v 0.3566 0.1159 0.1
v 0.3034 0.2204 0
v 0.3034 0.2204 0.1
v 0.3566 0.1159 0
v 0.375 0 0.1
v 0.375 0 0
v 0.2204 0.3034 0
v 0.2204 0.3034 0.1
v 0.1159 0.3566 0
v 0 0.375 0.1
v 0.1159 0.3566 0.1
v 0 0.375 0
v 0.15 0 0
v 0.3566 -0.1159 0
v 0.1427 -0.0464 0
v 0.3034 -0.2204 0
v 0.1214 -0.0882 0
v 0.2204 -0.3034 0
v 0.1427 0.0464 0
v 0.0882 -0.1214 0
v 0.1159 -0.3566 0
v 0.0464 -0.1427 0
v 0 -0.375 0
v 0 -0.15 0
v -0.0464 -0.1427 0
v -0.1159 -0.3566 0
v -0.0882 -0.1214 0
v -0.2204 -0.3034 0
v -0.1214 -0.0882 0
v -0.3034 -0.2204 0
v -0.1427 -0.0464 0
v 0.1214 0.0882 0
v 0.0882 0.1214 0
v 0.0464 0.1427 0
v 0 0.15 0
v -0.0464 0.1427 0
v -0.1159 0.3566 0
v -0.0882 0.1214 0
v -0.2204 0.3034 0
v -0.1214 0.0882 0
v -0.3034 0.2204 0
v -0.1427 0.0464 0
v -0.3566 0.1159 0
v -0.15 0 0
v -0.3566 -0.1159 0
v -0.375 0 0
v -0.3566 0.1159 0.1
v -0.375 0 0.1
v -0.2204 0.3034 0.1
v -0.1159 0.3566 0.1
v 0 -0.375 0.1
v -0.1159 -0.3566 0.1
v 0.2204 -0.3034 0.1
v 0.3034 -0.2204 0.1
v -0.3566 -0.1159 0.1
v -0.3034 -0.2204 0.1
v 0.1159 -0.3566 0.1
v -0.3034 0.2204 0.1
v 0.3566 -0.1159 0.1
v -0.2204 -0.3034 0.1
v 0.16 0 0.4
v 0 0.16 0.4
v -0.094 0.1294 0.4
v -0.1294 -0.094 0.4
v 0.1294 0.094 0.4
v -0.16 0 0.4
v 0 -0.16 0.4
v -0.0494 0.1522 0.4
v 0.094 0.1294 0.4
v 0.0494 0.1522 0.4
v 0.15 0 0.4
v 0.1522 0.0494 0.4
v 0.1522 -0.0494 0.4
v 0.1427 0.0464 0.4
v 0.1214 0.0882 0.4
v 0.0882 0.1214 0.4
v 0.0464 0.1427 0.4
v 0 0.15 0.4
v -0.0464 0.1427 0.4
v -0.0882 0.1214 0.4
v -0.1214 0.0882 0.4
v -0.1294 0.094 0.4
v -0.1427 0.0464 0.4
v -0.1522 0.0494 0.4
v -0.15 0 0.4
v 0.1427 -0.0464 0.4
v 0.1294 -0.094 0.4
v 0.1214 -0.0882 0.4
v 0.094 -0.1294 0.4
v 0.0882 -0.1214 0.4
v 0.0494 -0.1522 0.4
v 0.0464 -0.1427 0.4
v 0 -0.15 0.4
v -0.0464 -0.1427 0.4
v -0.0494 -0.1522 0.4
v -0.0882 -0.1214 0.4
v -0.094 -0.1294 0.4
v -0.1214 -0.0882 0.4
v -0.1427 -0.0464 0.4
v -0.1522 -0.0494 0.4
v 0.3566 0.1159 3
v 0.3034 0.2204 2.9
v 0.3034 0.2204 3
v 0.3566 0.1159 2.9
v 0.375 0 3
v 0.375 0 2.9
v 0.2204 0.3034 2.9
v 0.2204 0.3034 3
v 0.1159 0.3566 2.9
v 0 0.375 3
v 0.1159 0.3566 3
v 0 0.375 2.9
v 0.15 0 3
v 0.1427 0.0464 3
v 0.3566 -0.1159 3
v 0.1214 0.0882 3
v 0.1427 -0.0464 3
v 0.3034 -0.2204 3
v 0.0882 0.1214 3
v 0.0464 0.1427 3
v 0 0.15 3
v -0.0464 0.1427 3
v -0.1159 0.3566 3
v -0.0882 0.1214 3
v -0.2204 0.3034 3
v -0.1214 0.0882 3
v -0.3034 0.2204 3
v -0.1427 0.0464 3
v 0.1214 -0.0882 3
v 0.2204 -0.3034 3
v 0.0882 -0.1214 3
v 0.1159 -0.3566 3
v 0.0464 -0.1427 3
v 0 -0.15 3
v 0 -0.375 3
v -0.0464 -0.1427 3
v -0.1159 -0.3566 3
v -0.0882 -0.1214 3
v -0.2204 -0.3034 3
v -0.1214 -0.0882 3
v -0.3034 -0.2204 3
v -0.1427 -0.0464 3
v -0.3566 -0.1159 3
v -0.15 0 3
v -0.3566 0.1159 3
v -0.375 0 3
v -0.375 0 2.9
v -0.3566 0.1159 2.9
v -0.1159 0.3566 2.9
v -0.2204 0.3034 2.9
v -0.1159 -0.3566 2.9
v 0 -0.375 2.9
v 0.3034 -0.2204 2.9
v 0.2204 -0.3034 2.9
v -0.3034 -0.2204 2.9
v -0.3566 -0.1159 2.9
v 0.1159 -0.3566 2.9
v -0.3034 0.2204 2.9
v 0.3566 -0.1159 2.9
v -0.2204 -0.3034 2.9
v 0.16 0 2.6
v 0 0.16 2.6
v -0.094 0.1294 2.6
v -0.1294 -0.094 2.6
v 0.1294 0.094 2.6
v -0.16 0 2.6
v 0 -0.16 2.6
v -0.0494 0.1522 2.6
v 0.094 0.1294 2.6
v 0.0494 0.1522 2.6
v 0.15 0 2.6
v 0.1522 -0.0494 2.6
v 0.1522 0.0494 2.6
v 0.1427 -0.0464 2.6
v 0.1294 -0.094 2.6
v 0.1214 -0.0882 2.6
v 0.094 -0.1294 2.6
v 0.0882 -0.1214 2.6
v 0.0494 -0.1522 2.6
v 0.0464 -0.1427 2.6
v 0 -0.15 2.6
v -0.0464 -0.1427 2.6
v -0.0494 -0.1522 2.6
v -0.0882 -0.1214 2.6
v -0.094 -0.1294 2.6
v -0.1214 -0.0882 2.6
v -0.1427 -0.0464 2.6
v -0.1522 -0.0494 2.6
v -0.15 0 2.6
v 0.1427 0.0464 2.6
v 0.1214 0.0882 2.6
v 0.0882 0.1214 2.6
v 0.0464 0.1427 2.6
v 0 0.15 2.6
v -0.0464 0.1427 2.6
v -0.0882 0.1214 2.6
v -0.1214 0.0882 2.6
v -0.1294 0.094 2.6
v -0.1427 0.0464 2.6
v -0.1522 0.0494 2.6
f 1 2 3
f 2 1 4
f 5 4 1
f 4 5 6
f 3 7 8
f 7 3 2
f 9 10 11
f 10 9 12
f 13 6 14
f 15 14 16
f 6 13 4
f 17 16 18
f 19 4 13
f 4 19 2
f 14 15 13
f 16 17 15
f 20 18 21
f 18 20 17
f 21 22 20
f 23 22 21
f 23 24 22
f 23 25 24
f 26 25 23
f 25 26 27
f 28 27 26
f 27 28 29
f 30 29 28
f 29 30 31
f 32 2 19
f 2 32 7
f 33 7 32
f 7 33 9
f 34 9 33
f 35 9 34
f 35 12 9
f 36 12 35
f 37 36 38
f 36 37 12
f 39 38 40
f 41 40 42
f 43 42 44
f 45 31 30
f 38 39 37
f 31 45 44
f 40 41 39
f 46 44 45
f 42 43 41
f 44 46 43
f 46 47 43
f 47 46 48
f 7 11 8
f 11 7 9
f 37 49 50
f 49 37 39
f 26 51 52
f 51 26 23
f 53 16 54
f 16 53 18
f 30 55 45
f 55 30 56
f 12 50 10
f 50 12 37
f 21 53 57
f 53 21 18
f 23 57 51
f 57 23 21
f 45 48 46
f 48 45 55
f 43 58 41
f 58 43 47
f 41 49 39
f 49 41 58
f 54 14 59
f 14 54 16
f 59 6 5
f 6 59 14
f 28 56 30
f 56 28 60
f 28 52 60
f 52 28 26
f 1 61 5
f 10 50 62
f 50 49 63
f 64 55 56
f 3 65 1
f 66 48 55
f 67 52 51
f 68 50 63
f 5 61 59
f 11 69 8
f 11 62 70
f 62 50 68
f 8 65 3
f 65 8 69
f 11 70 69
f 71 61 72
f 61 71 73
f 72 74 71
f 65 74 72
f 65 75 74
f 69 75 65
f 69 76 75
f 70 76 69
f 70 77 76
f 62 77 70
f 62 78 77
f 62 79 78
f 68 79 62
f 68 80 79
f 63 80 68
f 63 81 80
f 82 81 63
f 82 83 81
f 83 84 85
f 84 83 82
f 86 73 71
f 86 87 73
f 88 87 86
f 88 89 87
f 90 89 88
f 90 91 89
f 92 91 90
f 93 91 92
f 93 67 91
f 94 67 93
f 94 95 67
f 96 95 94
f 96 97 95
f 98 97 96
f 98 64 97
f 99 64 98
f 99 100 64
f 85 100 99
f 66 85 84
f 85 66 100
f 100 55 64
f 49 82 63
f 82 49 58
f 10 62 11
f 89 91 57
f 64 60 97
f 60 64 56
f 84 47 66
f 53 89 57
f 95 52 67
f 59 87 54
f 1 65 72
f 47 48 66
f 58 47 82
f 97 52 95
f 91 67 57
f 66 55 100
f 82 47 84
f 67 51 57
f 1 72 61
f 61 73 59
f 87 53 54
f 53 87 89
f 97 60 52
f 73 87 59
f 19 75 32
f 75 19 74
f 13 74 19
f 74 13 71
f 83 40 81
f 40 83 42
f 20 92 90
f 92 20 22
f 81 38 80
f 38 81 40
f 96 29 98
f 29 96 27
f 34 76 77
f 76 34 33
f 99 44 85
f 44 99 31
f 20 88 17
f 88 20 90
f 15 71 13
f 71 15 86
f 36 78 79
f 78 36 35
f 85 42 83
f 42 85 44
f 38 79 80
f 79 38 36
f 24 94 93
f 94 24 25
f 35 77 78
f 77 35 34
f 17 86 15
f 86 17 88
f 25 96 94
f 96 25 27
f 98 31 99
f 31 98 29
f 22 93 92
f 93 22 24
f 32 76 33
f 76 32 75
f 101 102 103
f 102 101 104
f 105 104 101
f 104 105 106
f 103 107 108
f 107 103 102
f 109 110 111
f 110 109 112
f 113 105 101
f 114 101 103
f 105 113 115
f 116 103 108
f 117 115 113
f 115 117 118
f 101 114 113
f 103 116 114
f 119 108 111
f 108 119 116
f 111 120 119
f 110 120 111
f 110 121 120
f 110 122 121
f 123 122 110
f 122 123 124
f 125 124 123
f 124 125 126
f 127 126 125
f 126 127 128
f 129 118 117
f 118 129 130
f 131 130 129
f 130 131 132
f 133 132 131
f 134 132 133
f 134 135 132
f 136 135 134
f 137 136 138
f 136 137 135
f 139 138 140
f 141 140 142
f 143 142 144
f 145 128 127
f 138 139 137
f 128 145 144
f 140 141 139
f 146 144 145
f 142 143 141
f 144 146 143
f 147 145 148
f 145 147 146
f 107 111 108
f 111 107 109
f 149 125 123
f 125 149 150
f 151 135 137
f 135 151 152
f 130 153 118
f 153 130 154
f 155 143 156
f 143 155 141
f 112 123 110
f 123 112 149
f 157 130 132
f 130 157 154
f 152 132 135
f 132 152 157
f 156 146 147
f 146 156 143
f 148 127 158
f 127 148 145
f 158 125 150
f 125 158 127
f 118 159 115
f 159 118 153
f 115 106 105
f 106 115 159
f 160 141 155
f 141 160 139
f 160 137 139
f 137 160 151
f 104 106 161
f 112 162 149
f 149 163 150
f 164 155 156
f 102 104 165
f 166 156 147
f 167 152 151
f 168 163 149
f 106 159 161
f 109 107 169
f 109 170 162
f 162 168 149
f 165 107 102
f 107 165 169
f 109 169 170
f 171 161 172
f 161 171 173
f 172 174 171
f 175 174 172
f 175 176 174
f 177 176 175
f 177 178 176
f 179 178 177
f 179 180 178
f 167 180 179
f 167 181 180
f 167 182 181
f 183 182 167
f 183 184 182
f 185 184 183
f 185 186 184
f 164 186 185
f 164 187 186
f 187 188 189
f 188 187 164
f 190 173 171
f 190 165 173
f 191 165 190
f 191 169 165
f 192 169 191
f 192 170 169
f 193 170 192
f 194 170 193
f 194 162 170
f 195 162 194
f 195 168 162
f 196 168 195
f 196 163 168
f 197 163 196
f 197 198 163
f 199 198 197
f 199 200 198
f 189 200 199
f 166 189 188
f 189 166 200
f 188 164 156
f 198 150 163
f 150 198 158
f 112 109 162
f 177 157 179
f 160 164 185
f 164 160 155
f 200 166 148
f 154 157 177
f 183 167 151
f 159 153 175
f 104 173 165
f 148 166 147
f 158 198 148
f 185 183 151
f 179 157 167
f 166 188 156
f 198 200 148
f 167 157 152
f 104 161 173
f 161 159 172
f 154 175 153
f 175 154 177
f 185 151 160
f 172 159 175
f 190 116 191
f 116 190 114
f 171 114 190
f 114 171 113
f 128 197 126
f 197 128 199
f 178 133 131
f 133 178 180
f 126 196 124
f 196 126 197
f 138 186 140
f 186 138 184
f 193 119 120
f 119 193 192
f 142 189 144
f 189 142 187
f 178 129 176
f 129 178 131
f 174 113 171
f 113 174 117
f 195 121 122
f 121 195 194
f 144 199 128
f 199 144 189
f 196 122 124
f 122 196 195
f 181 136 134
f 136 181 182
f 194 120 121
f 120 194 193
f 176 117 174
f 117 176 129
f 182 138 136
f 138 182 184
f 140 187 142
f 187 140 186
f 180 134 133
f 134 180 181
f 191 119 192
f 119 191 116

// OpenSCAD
module spring_cap(base_length=0.1, cap_length=0.3, od=3/4, major_id=0.32, minor_id=0.3, $fn=20) {
  render()
  difference() {
    union() {
      cylinder(r=od/2, h=base_length);

      translate([0,0,base_length])
      cylinder(r1=od/2, r2=major_id/2, h=cap_length);
    }

    translate([0,0,-0.1])
    cylinder(r=minor_id/2, h=base_length + cap_length + 0.2);
  }
}

module SpringCartridge(debug=false) {
  spring_cap();

  // Spring
  if (debug)
  linear_extrude(height=3, twist=360 * 12)
  translate([.75/2 - 1/16,0,0])
  circle(r=1/32);

  translate([0,0,3])
  mirror([0,0,1])
  spring_cap();
}

!SpringCartridge();

!scale([25.4, 25.4, 25.4]) {
  spring_cap();

  translate([1,0,0])
  spring_cap();
}
